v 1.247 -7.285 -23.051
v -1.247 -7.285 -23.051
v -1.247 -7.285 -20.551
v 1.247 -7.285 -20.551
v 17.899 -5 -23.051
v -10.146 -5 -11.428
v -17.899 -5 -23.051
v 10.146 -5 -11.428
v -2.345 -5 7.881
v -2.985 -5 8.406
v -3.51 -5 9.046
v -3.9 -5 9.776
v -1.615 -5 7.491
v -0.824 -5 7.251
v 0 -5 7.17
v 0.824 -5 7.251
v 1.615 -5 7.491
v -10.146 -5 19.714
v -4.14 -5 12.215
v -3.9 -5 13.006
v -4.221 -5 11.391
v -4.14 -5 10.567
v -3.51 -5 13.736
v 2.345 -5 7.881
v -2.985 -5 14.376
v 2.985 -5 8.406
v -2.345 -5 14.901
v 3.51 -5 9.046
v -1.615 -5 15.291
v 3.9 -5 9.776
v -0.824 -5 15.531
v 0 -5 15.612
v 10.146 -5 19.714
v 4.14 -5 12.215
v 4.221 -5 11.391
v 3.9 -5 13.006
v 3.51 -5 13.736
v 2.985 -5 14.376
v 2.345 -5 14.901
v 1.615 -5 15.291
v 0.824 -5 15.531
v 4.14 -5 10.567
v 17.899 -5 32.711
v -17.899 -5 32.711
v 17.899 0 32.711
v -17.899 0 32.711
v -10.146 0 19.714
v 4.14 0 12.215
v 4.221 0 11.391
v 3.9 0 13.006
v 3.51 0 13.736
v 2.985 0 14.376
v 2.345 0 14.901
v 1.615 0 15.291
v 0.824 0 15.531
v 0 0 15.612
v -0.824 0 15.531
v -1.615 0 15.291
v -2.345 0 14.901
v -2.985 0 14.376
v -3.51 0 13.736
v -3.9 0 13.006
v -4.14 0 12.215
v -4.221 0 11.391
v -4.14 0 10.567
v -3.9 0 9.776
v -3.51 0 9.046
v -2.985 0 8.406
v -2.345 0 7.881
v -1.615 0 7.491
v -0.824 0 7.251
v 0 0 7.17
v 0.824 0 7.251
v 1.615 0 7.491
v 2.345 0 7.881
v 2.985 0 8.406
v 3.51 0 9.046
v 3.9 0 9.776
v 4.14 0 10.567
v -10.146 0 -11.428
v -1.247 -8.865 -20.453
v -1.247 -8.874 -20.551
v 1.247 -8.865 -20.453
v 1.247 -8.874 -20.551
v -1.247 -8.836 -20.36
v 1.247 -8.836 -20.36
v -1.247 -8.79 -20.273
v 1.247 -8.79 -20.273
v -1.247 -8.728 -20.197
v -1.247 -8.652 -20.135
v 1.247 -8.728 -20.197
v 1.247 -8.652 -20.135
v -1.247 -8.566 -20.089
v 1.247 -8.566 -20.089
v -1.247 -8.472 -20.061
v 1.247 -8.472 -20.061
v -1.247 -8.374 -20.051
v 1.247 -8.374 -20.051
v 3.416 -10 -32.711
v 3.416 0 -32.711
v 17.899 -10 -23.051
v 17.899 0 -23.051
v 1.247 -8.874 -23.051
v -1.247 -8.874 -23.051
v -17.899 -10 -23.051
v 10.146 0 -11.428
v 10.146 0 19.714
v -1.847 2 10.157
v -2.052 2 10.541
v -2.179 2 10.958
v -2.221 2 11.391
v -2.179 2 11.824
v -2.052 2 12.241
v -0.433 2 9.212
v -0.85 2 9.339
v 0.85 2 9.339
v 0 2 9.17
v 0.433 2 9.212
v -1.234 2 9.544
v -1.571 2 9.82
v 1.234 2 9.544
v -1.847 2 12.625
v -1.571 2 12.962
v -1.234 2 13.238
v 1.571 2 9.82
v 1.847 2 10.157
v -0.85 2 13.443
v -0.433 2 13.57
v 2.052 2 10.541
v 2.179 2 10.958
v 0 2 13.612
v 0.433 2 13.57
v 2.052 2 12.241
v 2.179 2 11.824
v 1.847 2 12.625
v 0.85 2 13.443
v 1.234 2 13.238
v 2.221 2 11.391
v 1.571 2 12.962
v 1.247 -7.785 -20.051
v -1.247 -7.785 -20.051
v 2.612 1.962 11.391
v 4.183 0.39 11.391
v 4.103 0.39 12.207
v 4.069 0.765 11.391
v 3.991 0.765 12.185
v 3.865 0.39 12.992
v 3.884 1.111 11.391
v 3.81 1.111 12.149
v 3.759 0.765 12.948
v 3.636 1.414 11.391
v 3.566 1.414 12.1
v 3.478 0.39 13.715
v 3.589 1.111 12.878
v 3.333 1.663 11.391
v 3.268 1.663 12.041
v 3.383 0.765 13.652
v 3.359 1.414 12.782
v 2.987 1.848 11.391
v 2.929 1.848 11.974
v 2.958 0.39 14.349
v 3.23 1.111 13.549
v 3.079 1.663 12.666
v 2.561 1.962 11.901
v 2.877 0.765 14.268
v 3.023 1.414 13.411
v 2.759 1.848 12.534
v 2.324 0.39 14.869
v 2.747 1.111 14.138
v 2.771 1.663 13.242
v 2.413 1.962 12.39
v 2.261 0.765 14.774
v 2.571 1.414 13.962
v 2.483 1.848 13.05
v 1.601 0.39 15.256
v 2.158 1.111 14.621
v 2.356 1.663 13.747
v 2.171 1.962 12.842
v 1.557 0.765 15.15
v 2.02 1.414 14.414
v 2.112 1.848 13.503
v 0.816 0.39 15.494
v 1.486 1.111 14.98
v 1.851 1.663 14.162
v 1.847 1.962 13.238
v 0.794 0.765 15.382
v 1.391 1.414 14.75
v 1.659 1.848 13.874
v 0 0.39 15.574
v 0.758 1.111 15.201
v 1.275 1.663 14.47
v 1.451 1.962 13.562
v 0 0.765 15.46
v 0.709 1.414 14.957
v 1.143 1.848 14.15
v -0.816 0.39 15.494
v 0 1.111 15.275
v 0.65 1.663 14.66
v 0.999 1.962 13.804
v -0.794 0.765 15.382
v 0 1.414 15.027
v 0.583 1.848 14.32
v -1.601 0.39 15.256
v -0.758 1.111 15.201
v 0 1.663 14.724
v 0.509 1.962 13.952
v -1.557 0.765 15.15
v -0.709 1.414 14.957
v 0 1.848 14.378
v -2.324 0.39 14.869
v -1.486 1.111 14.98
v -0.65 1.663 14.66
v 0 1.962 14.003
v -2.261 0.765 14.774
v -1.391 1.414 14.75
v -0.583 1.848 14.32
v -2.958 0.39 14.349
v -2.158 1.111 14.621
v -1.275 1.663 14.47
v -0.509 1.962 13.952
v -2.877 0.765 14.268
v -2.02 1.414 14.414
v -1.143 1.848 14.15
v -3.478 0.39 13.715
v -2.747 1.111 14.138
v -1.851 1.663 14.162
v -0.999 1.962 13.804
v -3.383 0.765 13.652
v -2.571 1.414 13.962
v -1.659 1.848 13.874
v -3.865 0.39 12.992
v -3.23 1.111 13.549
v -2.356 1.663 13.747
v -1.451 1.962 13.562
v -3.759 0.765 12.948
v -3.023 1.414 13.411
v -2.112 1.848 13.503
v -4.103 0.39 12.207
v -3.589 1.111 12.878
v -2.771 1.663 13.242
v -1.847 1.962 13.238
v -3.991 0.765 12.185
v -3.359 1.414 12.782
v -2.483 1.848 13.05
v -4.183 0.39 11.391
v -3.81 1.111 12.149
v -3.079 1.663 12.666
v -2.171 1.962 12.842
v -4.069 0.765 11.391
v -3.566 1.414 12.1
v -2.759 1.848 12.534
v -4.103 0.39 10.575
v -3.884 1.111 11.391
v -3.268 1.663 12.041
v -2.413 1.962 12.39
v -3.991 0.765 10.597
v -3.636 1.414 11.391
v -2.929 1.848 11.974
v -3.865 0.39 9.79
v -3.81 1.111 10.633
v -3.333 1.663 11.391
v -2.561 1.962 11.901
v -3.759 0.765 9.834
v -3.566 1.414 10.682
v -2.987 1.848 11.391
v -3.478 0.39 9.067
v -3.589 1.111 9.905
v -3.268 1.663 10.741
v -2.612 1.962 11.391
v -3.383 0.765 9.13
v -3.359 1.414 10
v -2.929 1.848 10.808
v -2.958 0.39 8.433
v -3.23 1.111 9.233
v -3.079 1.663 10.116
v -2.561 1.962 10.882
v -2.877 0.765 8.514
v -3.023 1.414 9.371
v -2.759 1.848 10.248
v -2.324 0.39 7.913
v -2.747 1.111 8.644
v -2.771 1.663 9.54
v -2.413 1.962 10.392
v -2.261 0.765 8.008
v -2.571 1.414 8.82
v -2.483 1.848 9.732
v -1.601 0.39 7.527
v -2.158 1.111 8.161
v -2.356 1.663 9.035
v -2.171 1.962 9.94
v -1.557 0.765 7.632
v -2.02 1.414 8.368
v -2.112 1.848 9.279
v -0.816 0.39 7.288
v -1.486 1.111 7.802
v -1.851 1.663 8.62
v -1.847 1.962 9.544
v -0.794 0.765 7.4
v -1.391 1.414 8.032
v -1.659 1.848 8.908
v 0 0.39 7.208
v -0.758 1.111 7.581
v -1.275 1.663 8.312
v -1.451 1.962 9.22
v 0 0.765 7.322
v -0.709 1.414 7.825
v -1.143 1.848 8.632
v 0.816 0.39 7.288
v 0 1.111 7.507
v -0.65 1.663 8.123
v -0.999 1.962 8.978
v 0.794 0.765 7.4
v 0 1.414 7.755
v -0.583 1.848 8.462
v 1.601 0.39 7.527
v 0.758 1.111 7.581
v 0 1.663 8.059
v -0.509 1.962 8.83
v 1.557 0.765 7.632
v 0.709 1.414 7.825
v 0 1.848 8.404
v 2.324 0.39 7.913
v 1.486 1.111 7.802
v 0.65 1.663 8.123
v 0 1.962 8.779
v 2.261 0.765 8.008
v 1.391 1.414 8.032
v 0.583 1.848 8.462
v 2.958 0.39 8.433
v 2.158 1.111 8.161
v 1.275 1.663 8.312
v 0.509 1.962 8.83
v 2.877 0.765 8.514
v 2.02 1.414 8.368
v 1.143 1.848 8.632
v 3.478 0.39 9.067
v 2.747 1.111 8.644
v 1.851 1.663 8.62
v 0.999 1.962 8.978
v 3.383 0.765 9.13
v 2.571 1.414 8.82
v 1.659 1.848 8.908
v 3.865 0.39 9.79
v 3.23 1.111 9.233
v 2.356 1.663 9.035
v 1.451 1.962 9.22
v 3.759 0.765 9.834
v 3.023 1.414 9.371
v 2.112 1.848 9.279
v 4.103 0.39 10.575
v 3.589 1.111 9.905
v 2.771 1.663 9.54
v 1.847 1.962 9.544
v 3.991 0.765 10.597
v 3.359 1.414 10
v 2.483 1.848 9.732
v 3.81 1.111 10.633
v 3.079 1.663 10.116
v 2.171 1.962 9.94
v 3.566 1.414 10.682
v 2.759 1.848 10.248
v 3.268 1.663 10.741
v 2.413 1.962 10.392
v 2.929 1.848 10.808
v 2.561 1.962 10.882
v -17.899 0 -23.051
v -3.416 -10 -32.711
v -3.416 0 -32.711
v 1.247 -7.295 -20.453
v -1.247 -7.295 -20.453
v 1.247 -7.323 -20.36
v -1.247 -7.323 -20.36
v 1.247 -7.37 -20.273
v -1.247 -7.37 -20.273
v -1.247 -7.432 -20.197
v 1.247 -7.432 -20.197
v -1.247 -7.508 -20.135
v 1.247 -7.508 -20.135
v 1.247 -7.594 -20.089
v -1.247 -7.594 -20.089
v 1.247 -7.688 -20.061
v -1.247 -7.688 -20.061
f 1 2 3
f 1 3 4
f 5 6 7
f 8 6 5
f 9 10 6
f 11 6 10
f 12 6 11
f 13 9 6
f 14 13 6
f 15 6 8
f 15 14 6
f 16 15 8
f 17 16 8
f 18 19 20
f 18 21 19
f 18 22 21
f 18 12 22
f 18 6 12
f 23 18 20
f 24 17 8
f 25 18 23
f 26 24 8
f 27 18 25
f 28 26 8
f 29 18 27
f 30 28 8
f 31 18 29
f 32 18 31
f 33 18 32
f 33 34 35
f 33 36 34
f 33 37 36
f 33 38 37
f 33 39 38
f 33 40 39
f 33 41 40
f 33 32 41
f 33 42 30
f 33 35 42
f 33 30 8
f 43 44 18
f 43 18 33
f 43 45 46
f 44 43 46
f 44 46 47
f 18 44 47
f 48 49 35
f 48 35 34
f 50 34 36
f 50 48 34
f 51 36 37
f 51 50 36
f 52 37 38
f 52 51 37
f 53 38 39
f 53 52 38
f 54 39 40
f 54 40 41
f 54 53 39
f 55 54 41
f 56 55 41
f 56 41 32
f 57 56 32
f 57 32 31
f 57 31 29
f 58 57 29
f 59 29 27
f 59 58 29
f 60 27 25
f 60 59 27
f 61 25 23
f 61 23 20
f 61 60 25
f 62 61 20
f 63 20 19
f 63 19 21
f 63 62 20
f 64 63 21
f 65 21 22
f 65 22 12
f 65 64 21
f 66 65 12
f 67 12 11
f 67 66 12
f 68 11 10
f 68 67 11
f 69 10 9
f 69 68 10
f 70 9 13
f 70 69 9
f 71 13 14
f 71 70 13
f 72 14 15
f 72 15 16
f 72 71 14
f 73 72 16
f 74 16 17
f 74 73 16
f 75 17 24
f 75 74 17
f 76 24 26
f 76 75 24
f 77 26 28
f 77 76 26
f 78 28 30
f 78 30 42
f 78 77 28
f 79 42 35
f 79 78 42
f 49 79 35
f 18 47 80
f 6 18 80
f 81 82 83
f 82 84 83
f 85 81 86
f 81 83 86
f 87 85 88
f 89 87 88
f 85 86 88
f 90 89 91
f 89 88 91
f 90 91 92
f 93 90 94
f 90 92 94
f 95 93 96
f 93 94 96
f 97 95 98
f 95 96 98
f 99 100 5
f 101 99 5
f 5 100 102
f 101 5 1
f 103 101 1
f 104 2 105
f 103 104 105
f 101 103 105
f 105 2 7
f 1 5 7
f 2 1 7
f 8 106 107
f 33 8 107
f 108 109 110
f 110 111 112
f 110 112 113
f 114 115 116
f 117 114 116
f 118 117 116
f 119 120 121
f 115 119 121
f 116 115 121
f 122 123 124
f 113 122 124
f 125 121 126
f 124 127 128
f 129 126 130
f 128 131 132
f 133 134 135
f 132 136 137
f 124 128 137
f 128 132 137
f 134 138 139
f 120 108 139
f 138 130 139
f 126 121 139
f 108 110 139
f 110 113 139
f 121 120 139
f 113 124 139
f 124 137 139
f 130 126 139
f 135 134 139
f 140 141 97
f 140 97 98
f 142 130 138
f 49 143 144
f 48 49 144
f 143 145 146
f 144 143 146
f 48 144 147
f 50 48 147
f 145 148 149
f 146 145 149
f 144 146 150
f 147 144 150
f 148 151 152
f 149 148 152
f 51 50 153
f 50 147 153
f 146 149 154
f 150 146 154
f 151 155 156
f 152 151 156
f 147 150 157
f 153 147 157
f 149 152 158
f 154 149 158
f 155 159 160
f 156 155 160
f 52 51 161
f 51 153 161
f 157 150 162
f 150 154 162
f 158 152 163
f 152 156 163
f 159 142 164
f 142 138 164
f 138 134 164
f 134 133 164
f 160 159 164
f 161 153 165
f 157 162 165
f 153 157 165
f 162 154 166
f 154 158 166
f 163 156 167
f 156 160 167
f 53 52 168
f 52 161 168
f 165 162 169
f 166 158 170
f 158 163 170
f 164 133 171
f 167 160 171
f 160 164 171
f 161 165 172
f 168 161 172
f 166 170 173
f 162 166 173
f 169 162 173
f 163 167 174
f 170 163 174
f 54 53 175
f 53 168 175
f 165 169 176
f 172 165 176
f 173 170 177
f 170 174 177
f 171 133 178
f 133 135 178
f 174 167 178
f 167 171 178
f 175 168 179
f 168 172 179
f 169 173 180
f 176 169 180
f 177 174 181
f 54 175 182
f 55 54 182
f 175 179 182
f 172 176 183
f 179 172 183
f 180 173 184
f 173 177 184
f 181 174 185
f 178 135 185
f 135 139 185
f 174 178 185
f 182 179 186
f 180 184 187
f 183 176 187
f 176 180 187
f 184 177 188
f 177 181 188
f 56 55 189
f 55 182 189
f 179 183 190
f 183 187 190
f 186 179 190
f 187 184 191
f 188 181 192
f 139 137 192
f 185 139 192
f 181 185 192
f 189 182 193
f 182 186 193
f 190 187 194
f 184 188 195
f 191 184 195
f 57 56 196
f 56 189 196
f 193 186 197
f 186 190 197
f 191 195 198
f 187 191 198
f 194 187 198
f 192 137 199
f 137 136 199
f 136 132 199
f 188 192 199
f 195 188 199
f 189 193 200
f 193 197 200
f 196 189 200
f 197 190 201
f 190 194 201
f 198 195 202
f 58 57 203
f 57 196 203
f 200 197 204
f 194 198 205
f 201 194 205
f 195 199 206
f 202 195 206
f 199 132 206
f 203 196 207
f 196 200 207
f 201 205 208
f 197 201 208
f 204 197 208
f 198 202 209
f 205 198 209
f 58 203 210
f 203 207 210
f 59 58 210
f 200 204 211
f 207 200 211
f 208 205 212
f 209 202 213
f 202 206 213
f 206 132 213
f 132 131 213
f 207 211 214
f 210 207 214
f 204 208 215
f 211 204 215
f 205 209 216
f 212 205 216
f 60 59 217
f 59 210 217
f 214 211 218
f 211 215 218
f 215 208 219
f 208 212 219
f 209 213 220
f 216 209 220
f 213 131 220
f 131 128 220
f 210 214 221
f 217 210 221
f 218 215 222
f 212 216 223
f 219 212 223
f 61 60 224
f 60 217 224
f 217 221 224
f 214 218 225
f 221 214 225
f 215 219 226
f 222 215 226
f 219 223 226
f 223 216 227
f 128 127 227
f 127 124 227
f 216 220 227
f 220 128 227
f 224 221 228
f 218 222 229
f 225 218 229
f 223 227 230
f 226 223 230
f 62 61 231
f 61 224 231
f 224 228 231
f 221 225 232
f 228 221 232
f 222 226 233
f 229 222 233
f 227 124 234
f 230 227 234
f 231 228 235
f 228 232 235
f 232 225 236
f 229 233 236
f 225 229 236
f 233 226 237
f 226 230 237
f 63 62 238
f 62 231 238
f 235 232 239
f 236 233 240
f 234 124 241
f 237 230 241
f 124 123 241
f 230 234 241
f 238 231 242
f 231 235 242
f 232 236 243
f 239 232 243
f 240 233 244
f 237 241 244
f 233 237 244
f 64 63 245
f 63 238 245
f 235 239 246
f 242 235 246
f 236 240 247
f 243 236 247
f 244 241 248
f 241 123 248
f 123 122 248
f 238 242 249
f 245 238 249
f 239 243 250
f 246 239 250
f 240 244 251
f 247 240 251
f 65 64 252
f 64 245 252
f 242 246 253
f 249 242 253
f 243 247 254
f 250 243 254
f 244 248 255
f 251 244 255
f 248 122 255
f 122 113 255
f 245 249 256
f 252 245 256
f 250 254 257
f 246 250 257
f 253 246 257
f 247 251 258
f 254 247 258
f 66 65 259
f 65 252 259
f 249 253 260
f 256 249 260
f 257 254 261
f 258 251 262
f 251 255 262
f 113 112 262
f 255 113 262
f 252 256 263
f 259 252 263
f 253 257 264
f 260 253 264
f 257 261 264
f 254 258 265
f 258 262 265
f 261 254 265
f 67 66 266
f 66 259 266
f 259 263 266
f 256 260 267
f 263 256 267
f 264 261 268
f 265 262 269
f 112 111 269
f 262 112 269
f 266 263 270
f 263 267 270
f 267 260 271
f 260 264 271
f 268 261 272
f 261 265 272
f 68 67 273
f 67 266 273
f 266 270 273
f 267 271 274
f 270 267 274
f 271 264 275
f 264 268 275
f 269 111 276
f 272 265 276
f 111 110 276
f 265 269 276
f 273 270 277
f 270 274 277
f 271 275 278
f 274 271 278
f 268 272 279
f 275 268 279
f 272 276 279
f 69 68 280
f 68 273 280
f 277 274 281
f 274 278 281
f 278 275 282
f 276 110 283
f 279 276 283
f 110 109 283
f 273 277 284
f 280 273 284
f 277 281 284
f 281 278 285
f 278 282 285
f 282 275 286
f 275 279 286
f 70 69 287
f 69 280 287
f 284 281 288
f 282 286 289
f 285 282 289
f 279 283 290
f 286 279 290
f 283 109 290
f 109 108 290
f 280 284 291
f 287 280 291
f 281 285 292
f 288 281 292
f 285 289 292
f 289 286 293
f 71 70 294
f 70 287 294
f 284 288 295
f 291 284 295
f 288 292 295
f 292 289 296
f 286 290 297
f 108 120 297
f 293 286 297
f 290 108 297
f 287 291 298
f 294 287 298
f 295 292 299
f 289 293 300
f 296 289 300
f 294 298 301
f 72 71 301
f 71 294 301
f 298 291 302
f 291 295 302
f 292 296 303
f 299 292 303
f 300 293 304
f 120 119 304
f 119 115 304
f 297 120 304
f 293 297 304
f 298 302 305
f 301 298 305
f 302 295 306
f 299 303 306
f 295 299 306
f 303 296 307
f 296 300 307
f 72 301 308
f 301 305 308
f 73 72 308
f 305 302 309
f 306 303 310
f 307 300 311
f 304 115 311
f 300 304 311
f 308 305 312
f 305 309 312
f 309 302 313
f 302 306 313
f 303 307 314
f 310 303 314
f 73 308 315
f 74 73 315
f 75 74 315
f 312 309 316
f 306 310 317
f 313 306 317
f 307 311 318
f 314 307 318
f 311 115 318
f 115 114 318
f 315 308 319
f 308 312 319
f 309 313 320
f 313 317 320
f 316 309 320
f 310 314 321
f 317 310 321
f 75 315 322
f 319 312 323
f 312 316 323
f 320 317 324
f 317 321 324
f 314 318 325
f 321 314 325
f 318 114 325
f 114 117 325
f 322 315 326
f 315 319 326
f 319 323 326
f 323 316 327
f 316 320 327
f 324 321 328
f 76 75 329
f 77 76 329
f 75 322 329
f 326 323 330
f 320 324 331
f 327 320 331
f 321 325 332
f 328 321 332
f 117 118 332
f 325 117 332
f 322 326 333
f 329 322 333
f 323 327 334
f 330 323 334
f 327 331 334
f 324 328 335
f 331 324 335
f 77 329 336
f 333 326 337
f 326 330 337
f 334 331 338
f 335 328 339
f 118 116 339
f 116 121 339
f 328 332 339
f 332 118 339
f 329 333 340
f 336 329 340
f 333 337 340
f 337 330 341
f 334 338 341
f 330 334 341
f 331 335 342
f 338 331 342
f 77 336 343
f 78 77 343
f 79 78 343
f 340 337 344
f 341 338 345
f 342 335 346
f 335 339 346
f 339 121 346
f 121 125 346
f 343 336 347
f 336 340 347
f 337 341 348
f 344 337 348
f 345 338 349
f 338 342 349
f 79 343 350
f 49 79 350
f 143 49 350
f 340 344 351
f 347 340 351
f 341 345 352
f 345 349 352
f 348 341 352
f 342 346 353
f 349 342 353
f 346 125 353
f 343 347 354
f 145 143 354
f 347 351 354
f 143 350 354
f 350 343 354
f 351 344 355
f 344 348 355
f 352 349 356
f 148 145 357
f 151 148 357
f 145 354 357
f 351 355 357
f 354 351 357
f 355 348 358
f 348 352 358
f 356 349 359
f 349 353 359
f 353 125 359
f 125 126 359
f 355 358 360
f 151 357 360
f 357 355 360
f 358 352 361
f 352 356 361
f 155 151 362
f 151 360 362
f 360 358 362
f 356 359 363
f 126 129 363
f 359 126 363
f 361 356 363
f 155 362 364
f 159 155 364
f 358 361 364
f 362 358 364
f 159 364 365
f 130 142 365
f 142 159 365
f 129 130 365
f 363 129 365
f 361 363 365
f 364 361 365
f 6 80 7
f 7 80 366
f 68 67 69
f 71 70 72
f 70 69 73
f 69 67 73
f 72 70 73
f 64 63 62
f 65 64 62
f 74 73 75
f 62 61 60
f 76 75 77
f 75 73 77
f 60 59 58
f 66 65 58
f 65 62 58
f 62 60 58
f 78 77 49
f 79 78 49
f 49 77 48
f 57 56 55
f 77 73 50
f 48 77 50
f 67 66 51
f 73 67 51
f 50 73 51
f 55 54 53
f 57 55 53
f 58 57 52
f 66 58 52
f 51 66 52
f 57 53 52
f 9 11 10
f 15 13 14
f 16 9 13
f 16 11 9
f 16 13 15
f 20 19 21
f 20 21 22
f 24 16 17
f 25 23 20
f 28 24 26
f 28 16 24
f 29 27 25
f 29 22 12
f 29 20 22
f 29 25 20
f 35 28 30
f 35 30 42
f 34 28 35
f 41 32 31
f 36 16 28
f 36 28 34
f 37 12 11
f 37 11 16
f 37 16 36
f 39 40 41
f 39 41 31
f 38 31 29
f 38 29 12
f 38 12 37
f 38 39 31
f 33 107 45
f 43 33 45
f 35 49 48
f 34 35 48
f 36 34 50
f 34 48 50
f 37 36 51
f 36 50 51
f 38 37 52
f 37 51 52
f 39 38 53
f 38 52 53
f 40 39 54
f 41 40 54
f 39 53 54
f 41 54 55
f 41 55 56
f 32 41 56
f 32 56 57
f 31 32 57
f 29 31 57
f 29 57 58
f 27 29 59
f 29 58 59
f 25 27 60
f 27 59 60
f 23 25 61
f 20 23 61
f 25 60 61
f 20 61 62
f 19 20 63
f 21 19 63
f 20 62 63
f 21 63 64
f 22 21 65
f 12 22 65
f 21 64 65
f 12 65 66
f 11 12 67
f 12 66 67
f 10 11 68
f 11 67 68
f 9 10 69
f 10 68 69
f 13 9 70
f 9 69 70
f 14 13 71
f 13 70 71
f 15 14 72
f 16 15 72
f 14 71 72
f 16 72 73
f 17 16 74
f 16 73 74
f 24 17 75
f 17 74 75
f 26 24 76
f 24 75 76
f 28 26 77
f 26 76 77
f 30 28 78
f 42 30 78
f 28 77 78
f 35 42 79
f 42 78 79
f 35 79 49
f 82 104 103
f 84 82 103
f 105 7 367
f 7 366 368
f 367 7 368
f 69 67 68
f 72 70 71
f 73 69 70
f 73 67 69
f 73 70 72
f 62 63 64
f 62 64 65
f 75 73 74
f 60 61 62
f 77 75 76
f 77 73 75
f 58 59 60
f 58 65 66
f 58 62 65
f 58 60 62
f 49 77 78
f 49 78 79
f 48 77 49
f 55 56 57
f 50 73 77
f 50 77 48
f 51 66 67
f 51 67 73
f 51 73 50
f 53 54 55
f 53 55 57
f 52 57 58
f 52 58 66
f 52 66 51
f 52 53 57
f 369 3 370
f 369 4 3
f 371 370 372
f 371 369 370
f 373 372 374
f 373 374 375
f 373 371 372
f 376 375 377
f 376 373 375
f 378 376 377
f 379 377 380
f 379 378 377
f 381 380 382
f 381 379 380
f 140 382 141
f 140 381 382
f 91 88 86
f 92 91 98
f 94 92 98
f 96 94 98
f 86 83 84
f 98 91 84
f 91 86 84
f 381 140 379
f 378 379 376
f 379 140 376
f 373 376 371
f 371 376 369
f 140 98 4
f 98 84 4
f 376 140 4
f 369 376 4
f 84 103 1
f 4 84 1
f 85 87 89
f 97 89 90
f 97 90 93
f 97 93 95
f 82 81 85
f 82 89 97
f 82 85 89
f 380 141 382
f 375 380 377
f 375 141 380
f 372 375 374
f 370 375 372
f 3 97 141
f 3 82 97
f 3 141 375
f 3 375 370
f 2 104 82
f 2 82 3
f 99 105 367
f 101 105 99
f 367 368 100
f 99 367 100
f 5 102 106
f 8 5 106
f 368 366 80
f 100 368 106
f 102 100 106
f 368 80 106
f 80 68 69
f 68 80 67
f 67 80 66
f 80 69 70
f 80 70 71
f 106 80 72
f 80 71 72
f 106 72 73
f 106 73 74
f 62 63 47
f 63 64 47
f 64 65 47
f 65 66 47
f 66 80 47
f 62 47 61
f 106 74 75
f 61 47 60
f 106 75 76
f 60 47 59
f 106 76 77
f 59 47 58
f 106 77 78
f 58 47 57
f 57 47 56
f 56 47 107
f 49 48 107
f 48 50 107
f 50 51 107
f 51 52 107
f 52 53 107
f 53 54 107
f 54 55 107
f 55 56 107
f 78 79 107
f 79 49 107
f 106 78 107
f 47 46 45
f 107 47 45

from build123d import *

# Parameters (mm, degrees)
F0_R     = 4.2213718129
F1_DEPTH = 5
F2_DEPTH = 10
F3_DEPTH = 2
F4_R     = 1.99999
F5_DEPTH = 5
F6_W     = 2.4935528636
F6_H     = 1.5890598297
F7_DEPTH = 3
F8_R     = 0.5


# Not quite as in the source:
# - a fillet or chamfer is up to 0.001 mm smaller than in the source, because OpenCascade refuses the exact size


with BuildPart() as f1:
    # F0 (on Front) → F1 (new body)
    with BuildSketch(Plane.XZ):
        Polygon((-17.8985148668, -23.0509787798), (17.8985148668, -23.0509787798), (10.1462722469, -11.4283849092), (10.1462722469, 19.7144318372), (17.8985148668, 32.7110886574), (-17.8985148668, 32.7110886574), (-10.1462722469, 19.7144318372), (-10.1462722469, -11.4283849092), align=None)
        with Locations((0, 11.391043663)):
            Circle(F0_R, mode=Mode.SUBTRACT)
    extrude(amount=F1_DEPTH)

    # F0 (on Front) → F2 (join)
    with BuildSketch(Plane.XZ):
        Polygon((-3.4155401514, -32.7110886574), (3.4155401514, -32.7110886574), (17.8985148668, -23.0509787798), (-17.8985148668, -23.0509787798), align=None)
    extrude(amount=F2_DEPTH)

    # F6 (on face) → F7 (join)
    with BuildSketch(Plane.XY.offset(-23.0509787798)):
        with Locations((0, -8.0799311399)):
            Rectangle(F6_W, F6_H)
    extrude(amount=F7_DEPTH)

    # F8
    f8_edges = [f1.edges().sort_by_distance(p)[0] for p in [
        (0, -8.874461, -20.050979),
        (0, -7.285401, -20.050979),
    ]]
    fillet(f8_edges, radius=F8_R)


with BuildPart() as f3:
    # F0 (on Front) → F3 (new body)
    with BuildSketch(Plane.XZ):
        with Locations((0, 11.391043663)):
            Circle(F0_R)
    extrude(amount=-F3_DEPTH)

    # F4 (radius 2 in the source; OpenCascade refuses exactly that, so slightly less here)
    f4_edges = [f3.edges().sort_by_distance(p)[0] for p in [
        (-4.221372, 2, 11.391044),
    ]]
    fillet(f4_edges, radius=F4_R)


with BuildPart() as f5:
    # F0 (on Front) → F5 (new body)
    with BuildSketch(Plane.XZ):
        with Locations((0, 11.391043663)):
            Circle(F0_R)
    extrude(amount=F5_DEPTH)


solid = Compound([f1.part, f3.part, f5.part])
